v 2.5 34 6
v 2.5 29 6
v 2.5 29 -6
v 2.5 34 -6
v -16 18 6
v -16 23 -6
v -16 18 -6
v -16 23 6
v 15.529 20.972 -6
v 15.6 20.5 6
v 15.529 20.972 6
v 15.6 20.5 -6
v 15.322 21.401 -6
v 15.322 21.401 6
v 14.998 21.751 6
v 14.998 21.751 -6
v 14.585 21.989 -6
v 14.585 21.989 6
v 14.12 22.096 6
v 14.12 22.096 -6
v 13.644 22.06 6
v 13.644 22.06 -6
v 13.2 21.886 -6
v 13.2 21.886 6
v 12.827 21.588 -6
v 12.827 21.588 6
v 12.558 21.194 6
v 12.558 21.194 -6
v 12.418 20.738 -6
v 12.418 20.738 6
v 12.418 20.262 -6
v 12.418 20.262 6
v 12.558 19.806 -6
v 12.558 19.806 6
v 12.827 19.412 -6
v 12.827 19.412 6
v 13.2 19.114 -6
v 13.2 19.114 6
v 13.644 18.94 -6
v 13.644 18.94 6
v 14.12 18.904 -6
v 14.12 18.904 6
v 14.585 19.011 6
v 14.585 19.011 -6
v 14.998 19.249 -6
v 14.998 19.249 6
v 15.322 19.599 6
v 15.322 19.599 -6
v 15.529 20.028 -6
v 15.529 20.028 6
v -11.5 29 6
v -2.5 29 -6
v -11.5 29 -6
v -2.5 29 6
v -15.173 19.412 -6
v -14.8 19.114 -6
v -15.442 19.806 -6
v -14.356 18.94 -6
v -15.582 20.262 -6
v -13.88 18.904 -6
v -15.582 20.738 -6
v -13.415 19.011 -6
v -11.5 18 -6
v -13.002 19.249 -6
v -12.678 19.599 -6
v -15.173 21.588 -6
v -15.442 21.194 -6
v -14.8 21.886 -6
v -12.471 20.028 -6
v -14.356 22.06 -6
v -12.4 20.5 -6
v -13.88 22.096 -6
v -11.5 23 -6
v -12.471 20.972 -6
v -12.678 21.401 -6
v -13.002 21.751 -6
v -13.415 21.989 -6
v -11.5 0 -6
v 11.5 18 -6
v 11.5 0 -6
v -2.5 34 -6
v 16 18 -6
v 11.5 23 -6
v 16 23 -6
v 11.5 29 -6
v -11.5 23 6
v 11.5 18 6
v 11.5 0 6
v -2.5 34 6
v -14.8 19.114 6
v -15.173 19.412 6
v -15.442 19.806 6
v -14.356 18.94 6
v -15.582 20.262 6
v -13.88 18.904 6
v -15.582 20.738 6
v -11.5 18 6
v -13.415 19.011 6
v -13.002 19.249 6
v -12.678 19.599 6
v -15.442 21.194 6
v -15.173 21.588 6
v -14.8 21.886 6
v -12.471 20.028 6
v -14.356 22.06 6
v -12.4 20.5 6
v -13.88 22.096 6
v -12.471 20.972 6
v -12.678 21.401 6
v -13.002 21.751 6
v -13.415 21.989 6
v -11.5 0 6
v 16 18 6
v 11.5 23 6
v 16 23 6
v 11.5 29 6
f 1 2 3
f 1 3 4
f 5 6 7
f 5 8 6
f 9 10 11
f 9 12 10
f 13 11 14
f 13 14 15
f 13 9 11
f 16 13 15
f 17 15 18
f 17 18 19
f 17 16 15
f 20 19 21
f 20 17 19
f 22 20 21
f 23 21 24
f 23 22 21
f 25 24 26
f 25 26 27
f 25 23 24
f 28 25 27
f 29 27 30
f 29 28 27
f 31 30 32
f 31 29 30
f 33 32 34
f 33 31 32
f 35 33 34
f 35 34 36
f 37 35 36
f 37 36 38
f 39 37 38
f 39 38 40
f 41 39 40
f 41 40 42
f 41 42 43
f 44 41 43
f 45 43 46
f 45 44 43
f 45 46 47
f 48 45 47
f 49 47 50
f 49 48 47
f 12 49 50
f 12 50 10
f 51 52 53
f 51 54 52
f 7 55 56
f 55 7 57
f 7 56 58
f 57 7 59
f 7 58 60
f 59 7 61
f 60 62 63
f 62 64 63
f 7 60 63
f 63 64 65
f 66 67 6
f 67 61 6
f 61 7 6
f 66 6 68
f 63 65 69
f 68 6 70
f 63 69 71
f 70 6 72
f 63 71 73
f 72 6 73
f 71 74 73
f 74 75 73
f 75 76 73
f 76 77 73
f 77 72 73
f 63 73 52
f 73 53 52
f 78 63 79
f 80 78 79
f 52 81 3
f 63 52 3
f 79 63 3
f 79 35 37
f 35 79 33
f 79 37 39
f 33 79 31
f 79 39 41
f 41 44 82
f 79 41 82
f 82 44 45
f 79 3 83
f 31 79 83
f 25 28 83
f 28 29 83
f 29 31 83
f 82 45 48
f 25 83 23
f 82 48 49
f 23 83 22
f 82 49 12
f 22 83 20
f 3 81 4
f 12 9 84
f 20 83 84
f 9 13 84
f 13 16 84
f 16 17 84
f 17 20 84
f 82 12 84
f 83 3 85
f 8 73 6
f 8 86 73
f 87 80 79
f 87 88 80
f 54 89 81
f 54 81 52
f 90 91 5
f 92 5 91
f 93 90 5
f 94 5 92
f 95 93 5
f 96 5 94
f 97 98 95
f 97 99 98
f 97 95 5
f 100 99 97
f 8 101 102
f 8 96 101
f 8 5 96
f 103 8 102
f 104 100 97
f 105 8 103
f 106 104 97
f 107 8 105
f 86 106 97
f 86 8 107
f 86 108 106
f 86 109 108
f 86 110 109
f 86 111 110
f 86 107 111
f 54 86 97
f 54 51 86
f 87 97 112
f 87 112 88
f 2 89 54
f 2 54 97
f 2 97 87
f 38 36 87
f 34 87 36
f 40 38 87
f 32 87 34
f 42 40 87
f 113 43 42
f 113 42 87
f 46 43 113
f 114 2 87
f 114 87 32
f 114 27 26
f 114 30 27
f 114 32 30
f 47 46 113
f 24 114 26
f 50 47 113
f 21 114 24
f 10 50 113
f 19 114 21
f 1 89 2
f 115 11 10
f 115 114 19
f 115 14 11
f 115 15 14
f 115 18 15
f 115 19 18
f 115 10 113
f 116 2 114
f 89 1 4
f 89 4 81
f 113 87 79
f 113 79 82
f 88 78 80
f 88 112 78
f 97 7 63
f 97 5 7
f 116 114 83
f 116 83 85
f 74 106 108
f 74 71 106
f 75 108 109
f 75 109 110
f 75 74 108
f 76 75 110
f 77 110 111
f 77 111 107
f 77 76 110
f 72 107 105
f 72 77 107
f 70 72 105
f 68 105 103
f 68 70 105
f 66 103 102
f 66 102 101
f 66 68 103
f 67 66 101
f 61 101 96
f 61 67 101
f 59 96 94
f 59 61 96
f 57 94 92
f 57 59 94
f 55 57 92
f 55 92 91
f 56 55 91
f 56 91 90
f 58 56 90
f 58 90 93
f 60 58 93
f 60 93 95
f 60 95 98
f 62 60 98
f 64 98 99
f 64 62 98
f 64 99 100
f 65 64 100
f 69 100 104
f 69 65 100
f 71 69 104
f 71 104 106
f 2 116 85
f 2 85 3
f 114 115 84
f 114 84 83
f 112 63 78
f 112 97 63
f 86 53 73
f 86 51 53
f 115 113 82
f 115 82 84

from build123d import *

# Parameters (mm, degrees)
SKETCH_1_R      = 1.6
EXTRUDE_1_DEPTH = 6


with BuildPart() as part:
    # 草图1 → 凸台-拉伸1 (new, symmetric)
    with BuildSketch(Plane.XY):
        Polygon((11.5, 0), (11.5, 18), (16, 18), (16, 23), (11.5, 23), (11.5, 29), (2.5, 29), (2.5, 34), (-2.5, 34), (-2.5, 29), (-11.5, 29), (-11.5, 23), (-16, 23), (-16, 18), (-11.5, 18), (-11.5, 0), align=None)
        with Locations((14, 20.5)):
            Circle(SKETCH_1_R, mode=Mode.SUBTRACT)
        with Locations((-14, 20.5)):
            Circle(SKETCH_1_R, mode=Mode.SUBTRACT)
    extrude(amount=EXTRUDE_1_DEPTH, both=True)


solid = part.part
